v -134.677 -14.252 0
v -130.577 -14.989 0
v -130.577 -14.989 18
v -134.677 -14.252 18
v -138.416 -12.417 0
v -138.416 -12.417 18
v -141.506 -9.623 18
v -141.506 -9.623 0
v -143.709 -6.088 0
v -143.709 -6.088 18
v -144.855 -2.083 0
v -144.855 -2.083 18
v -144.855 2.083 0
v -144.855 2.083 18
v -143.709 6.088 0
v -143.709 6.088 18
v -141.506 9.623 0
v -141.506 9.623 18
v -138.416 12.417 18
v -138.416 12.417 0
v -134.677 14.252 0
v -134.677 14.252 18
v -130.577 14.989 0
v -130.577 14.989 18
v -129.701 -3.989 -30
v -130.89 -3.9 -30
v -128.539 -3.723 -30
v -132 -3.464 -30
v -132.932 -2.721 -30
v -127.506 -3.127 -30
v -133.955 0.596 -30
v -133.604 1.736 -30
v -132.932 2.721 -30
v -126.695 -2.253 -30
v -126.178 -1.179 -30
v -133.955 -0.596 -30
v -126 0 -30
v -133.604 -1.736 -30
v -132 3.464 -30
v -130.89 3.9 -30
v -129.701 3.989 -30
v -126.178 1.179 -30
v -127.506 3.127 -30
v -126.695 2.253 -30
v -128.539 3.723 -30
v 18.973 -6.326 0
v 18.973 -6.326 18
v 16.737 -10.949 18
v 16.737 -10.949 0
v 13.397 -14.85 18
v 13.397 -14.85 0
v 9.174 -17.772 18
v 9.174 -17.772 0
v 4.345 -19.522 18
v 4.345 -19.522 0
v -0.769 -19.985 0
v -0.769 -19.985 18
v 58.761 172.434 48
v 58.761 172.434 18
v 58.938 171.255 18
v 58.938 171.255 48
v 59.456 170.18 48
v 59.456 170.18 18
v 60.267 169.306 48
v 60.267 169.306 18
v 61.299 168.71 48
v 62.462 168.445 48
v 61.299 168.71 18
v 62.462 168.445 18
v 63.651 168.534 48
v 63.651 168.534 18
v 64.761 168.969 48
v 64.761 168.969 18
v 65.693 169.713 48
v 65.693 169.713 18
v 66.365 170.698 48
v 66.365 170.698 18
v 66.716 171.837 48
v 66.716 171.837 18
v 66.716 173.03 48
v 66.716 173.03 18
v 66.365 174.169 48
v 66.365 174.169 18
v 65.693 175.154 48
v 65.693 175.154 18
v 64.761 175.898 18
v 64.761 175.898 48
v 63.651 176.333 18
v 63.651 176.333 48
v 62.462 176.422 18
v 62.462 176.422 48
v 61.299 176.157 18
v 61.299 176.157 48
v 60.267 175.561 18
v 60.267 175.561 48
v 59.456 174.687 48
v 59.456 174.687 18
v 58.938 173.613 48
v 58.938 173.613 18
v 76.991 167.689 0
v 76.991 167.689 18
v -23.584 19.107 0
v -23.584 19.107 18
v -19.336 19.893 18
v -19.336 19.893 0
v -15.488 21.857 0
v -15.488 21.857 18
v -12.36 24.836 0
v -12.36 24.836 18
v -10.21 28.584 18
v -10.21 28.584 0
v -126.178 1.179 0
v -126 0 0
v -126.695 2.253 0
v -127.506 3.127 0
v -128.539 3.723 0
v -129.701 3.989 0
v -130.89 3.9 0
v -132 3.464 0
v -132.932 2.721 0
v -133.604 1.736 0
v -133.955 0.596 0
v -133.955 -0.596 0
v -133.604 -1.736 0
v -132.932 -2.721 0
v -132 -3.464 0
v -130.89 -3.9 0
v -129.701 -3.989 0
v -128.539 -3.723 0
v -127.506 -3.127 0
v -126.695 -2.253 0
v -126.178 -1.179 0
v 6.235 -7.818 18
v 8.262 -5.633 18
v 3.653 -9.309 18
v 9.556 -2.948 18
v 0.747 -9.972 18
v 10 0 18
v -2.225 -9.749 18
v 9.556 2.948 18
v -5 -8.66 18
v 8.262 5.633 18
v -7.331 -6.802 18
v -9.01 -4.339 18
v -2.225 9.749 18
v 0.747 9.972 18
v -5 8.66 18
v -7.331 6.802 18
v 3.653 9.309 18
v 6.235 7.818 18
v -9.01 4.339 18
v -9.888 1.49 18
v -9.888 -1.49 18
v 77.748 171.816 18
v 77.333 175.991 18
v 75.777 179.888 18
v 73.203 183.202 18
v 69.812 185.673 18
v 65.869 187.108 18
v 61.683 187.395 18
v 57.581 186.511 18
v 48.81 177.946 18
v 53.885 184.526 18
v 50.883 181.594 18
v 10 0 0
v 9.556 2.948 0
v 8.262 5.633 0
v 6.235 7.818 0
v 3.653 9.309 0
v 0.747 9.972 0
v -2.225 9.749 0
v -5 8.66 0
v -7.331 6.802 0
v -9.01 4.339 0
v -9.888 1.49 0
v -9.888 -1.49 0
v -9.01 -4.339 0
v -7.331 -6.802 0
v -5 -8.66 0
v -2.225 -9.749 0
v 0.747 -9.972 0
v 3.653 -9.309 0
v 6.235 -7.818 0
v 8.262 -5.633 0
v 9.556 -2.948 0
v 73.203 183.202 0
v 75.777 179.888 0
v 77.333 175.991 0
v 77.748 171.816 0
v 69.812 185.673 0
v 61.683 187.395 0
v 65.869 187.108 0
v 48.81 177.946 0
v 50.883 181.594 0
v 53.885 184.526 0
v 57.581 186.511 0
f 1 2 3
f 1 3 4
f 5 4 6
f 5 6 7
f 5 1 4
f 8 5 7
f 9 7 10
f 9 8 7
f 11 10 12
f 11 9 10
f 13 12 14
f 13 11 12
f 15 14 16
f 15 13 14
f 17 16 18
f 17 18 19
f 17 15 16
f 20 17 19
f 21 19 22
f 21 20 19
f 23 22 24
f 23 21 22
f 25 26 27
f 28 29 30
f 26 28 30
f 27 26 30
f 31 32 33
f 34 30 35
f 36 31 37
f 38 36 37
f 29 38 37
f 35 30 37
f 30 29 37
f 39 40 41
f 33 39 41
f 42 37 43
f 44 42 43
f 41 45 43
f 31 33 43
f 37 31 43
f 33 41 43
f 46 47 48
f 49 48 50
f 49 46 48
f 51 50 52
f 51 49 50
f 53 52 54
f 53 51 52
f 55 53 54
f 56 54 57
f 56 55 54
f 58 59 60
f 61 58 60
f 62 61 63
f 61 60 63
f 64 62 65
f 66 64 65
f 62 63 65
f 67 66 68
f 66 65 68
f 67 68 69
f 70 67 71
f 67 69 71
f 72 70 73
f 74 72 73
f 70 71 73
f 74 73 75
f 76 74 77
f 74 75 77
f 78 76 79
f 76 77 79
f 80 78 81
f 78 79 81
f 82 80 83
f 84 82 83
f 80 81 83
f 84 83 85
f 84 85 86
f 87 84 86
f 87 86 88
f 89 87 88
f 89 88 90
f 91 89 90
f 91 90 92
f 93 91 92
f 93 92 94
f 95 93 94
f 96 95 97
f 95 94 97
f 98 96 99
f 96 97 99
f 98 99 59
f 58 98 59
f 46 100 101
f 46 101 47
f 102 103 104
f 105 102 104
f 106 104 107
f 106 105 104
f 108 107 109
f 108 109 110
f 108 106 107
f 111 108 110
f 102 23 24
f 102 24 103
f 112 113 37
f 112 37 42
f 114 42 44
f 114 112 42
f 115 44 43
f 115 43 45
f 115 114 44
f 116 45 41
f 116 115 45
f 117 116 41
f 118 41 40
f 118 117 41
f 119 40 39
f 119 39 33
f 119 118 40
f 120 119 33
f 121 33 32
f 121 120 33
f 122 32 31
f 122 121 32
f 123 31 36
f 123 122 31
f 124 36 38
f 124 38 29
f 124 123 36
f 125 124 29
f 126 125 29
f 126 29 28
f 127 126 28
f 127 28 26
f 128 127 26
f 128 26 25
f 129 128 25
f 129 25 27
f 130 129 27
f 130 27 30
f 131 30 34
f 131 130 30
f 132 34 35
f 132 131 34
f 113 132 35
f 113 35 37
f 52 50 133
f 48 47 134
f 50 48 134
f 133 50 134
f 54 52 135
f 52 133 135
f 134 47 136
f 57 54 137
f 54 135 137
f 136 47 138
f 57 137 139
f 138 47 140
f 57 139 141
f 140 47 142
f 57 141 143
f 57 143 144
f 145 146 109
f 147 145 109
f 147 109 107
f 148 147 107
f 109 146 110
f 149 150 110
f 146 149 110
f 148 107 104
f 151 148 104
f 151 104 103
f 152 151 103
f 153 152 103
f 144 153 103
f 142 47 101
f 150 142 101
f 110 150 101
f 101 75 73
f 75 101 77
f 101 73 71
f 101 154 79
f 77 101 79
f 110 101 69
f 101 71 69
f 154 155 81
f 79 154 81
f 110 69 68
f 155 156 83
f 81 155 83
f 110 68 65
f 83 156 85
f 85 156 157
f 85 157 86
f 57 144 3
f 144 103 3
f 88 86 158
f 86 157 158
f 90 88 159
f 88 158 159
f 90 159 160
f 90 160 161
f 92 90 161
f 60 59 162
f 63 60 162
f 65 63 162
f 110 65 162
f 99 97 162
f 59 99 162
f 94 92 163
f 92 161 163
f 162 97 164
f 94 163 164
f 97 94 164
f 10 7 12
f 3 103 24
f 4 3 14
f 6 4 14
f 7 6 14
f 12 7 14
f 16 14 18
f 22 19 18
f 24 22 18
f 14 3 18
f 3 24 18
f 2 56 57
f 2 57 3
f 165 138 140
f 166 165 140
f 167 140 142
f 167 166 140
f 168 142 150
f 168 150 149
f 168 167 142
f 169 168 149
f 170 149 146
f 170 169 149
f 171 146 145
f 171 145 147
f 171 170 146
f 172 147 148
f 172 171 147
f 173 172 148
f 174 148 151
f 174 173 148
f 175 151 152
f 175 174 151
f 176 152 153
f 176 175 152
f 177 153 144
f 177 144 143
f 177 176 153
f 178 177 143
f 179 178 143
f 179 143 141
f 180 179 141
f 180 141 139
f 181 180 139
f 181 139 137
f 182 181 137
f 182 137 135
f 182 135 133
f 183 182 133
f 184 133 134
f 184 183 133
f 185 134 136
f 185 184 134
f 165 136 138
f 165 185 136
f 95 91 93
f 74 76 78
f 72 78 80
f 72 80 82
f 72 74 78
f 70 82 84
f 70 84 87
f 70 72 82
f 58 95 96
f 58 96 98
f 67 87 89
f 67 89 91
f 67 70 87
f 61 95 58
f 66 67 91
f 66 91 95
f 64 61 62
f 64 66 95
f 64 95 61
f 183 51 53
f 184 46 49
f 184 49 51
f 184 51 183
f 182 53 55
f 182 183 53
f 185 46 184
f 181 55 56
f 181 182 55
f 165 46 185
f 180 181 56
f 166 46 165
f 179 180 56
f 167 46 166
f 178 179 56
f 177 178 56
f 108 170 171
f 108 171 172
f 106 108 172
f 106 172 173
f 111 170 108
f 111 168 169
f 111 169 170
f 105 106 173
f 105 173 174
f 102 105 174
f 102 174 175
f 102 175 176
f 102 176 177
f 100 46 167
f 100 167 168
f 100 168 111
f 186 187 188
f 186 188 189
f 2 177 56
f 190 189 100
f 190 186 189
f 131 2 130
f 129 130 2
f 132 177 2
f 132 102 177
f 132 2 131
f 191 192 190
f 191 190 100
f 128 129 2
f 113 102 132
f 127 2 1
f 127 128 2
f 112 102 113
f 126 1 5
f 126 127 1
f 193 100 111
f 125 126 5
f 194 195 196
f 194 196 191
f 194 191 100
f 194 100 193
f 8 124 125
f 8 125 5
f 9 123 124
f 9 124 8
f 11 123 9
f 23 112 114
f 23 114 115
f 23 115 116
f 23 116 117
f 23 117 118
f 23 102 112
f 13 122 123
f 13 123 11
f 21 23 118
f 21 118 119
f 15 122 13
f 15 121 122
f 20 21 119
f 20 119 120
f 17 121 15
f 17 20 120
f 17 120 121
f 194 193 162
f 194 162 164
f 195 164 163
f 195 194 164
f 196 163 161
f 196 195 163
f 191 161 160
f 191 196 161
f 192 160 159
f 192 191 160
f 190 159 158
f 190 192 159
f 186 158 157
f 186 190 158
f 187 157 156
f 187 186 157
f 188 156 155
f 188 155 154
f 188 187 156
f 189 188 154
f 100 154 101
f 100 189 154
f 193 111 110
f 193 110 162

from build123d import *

# Parameters (mm, degrees)
EXTRUDE_1_DEPTH     = 18
SKETCH_2_R          = 10
CUT_EXTRUDE_1_DEPTH = 18
SKETCH_3_R          = 4
EXTRUDE_2_DEPTH     = 30
SKETCH_4_R          = 4
EXTRUDE_3_DEPTH     = 30


with BuildPart() as part:
    # 草图1 → 凸台-拉伸1 (new body)
    with BuildSketch(Plane.XY):
        with BuildLine():
            Line((-0.769230769, -19.985201626), (-130.576923077, -14.988901219))
            ThreePointArc((-130.576923077, -14.988901219), (-145, 0), (-130.576923077, 14.988901219))
            Line((-130.576923077, 14.988901219), (-23.583519409, 19.107079247))
            ThreePointArc((-23.583519409, 19.107079247), (-15.488001892, 21.85715805), (-10.210076964, 28.583512616))
            Line((-10.210076964, 28.583512616), (48.810330778, 177.946063765))
            ThreePointArc((48.810330778, 177.946063765), (67.89099845, 186.528985226), (76.990642321, 167.689269171))
            Line((76.990642321, 167.689269171), (18.973261361, -6.325768991))
            ThreePointArc((18.973261361, -6.325768991), (11.379442316, -16.447136303), (-0.769230769, -19.985201626))
        make_face()
    extrude(amount=EXTRUDE_1_DEPTH)

    # 草图2 → 切除-拉伸1 (cut)
    with BuildSketch(Plane.XY):
        Circle(SKETCH_2_R)
    extrude(amount=CUT_EXTRUDE_1_DEPTH, mode=Mode.SUBTRACT)

    # 草图3 → 凸台-拉伸2 (add)
    with BuildSketch(Plane.XY):
        with Locations((-130, 0)):
            Circle(SKETCH_3_R)
    extrude(amount=-EXTRUDE_2_DEPTH)

    # 草图4 → 凸台-拉伸3 (add)
    with BuildSketch(Plane.XY.offset(18)):
        with Locations(Location((62.7606963, 172.433595914, 0), (0, 0, 180))):
            Circle(SKETCH_4_R)
    extrude(amount=EXTRUDE_3_DEPTH)


solid = part.part
